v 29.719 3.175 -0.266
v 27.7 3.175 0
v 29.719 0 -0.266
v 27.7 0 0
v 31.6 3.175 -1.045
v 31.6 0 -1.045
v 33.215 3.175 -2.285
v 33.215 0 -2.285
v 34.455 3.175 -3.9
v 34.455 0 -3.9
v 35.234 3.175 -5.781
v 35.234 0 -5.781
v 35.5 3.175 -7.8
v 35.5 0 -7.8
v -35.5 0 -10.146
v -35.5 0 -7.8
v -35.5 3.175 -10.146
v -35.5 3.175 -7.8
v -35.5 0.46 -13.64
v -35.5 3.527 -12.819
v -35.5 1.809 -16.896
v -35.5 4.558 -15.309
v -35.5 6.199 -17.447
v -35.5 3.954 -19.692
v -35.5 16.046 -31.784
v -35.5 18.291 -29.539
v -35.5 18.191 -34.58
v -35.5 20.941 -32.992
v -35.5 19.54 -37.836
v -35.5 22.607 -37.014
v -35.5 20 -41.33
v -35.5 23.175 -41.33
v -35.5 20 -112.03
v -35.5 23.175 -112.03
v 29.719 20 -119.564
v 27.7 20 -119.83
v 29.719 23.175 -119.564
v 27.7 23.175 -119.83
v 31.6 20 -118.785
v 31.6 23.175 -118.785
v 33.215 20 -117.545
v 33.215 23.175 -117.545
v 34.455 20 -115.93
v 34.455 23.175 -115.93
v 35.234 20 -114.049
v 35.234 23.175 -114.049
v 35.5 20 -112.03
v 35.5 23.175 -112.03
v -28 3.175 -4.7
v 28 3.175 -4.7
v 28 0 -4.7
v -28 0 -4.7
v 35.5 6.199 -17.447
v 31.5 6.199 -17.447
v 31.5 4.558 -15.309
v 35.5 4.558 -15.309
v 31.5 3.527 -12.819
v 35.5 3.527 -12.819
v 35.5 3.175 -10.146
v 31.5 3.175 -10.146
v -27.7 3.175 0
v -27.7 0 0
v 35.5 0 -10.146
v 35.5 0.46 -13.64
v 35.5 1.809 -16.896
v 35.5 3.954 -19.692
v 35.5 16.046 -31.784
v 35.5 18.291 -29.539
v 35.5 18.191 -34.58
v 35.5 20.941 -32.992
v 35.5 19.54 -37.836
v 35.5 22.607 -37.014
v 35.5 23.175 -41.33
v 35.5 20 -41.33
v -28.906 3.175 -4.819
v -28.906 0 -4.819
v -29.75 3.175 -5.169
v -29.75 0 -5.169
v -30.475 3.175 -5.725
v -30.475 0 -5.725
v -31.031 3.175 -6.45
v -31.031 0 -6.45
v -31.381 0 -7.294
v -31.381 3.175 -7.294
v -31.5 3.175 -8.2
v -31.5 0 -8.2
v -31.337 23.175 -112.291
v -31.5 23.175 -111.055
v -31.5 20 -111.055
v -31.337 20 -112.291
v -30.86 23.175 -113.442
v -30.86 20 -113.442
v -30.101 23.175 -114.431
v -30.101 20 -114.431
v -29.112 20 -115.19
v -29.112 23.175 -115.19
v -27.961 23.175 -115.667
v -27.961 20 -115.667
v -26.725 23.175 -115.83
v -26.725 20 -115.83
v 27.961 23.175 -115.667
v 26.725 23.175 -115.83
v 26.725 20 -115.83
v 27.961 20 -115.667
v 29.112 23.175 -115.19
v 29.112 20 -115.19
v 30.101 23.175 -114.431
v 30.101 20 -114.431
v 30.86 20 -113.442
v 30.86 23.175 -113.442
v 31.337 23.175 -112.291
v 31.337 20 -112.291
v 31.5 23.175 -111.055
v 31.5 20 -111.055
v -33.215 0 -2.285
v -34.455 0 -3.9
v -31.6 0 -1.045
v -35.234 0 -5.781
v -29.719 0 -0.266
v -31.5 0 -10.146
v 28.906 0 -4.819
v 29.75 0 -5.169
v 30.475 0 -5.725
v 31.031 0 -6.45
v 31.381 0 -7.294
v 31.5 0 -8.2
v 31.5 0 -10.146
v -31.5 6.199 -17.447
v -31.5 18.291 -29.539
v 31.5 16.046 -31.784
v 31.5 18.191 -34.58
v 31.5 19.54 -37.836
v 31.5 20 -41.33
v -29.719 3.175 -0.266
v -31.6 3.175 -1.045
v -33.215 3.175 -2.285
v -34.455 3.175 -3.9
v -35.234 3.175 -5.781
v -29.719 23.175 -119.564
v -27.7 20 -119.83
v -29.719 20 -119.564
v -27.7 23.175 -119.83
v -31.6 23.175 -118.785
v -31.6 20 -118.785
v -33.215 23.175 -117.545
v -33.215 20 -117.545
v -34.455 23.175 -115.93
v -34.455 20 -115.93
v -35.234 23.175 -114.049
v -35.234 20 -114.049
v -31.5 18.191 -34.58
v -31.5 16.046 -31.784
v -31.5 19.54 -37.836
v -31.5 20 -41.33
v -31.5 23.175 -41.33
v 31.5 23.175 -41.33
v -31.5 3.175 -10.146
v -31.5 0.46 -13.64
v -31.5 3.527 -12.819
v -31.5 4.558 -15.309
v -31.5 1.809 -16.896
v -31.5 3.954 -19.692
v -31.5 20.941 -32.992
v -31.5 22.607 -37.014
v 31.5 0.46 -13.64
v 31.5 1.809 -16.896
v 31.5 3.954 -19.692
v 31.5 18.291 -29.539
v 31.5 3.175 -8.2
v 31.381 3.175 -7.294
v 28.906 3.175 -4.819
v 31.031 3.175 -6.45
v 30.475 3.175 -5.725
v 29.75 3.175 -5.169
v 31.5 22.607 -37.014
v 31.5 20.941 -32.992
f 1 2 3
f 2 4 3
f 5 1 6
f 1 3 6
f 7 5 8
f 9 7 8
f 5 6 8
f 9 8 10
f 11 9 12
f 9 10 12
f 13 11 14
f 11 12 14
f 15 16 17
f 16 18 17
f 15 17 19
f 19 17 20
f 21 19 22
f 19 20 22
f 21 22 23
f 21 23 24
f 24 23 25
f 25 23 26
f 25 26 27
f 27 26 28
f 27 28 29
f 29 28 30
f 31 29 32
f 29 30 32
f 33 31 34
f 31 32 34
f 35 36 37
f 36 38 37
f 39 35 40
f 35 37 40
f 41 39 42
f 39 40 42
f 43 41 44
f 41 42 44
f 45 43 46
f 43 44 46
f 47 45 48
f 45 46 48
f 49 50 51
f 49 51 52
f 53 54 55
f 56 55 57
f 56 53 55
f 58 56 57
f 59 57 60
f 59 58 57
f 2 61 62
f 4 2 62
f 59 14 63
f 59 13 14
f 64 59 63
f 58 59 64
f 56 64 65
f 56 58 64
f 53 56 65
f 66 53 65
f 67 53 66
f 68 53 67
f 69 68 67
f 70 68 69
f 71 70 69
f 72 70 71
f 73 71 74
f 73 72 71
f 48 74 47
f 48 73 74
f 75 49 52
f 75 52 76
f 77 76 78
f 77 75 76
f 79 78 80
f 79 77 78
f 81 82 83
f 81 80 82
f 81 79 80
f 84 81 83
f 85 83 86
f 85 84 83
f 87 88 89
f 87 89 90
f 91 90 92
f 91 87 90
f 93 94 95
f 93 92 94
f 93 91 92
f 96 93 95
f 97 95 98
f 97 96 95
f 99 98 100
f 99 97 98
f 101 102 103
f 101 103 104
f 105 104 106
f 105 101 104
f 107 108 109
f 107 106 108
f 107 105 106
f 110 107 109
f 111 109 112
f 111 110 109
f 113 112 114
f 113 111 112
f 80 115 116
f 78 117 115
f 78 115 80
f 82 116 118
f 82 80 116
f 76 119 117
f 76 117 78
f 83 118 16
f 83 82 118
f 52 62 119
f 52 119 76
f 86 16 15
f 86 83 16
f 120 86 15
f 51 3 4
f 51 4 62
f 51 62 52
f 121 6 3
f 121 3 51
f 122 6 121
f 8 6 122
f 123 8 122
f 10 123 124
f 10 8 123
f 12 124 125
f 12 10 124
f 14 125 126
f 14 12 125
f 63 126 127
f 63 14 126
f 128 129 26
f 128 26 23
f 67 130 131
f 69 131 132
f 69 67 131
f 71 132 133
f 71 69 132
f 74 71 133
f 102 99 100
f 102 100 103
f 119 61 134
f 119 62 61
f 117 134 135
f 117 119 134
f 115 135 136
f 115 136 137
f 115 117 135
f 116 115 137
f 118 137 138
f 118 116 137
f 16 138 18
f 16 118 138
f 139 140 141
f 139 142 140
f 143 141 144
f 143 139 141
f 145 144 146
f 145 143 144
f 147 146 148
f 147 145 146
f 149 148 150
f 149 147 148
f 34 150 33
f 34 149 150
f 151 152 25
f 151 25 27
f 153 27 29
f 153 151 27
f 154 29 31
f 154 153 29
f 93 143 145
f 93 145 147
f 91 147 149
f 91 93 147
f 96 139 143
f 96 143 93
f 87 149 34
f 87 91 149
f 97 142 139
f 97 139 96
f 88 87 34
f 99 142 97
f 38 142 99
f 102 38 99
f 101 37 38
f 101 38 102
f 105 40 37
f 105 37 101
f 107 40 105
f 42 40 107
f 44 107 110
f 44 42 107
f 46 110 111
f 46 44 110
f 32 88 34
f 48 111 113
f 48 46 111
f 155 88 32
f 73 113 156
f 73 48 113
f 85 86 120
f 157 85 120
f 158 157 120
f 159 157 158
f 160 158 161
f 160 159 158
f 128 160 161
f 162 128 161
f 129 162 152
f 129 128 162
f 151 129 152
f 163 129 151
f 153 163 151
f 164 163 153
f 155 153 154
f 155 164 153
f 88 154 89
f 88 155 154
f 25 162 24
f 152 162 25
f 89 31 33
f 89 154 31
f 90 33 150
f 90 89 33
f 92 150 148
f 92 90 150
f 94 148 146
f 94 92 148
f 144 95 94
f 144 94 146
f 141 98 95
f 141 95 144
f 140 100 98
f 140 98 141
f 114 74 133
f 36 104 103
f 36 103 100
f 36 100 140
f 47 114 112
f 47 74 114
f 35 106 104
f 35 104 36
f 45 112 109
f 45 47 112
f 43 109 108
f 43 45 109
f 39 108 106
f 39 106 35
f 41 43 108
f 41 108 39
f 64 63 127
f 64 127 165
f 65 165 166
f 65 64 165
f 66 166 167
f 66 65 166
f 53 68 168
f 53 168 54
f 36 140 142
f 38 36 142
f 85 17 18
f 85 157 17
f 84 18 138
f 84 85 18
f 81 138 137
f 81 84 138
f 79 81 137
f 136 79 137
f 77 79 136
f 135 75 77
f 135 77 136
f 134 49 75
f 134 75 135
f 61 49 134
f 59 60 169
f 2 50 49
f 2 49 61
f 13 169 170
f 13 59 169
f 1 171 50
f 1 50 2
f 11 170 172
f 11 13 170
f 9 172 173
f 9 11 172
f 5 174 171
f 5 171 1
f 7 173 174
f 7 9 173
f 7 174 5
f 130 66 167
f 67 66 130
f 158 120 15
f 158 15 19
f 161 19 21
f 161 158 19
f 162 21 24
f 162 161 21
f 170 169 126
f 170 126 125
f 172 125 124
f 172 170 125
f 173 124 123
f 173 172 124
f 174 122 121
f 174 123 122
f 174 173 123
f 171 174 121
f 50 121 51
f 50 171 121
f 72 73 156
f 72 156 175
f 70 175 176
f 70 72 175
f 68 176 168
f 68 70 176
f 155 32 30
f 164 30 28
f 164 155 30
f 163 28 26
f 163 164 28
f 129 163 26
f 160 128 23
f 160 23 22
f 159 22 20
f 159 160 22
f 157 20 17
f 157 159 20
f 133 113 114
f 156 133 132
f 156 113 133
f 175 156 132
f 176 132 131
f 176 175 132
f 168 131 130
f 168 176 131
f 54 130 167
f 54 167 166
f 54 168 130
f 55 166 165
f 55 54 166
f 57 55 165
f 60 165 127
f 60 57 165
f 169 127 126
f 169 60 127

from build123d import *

# Parameters (mm, degrees)
BASE_FLANGE3_DEPTH = 35.5
FILLET1_R          = 7.8
CUT_EXTRUDE1_DEPTH = 128.108455757


# Sheet-metal steps are written as plain solids
with BuildPart() as part:
    # Sketch1 → Base-Flange3 (new, symmetric)
    with BuildSketch(Plane(origin=(0, 0, 0), x_dir=(0, 0, -1), z_dir=(1, 0, 0))):
        with BuildLine():
            Line((0, 0), (10.146233816, 0))
            ThreePointArc((10.146233816, 0), (15.312460153, 1.027626311), (19.692175362, 3.954058454))
            Line((19.692175362, 3.954058454), (31.784058454, 16.045941546))
            ThreePointArc((31.784058454, 16.045941546), (36.163773663, 18.972373689), (41.33, 20))
            Line((41.33, 20), (119.83, 20))
            Line((119.83, 20), (119.83, 23.175))
            Line((119.83, 23.175), (41.33, 23.175))
            ThreePointArc((41.33, 23.175), (34.948753765, 21.905691205), (29.538994424, 18.291005576))
            Line((29.538994424, 18.291005576), (17.447111332, 6.199122484))
            ThreePointArc((17.447111332, 6.199122484), (14.097440255, 3.960943827), (10.146233816, 3.175))
            Line((10.146233816, 3.175), (0, 3.175))
            Line((0, 3.175), (0, 0))
        make_face()
    extrude(amount=BASE_FLANGE3_DEPTH, both=True)

    # Fillet1
    fillet1_edges = [part.edges().sort_by_distance(p)[0] for p in [
        (-35.5, 1.5875, 0),
        (-35.5, 21.5875, -119.83),
        (35.5, 1.5875, 0),
        (35.5, 21.5875, -119.83),
    ]]
    fillet(fillet1_edges, radius=FILLET1_R)

    # Sketch15 → Cut-Extrude1 (cut, through all)
    with BuildSketch(Plane(origin=(0, 23.175, 0), x_dir=(1, 0, 0), z_dir=(0, 1, 0))):
        with BuildLine():
            Line((-26.725, 115.83), (26.725, 115.83))
            ThreePointArc((26.725, 115.83), (30.10143488, 114.43143488), (31.5, 111.055))
            Line((31.5, 111.055), (31.5, 8.2))
            ThreePointArc((31.5, 8.2), (30.474873734, 5.725126266), (28, 4.7))
            Line((28, 4.7), (-28, 4.7))
            ThreePointArc((-28, 4.7), (-30.474873734, 5.725126266), (-31.5, 8.2))
            Line((-31.5, 8.2), (-31.5, 111.055))
            ThreePointArc((-31.5, 111.055), (-30.10143488, 114.43143488), (-26.725, 115.83))
        make_face()
    extrude(amount=-CUT_EXTRUDE1_DEPTH, mode=Mode.SUBTRACT)


solid = part.part
